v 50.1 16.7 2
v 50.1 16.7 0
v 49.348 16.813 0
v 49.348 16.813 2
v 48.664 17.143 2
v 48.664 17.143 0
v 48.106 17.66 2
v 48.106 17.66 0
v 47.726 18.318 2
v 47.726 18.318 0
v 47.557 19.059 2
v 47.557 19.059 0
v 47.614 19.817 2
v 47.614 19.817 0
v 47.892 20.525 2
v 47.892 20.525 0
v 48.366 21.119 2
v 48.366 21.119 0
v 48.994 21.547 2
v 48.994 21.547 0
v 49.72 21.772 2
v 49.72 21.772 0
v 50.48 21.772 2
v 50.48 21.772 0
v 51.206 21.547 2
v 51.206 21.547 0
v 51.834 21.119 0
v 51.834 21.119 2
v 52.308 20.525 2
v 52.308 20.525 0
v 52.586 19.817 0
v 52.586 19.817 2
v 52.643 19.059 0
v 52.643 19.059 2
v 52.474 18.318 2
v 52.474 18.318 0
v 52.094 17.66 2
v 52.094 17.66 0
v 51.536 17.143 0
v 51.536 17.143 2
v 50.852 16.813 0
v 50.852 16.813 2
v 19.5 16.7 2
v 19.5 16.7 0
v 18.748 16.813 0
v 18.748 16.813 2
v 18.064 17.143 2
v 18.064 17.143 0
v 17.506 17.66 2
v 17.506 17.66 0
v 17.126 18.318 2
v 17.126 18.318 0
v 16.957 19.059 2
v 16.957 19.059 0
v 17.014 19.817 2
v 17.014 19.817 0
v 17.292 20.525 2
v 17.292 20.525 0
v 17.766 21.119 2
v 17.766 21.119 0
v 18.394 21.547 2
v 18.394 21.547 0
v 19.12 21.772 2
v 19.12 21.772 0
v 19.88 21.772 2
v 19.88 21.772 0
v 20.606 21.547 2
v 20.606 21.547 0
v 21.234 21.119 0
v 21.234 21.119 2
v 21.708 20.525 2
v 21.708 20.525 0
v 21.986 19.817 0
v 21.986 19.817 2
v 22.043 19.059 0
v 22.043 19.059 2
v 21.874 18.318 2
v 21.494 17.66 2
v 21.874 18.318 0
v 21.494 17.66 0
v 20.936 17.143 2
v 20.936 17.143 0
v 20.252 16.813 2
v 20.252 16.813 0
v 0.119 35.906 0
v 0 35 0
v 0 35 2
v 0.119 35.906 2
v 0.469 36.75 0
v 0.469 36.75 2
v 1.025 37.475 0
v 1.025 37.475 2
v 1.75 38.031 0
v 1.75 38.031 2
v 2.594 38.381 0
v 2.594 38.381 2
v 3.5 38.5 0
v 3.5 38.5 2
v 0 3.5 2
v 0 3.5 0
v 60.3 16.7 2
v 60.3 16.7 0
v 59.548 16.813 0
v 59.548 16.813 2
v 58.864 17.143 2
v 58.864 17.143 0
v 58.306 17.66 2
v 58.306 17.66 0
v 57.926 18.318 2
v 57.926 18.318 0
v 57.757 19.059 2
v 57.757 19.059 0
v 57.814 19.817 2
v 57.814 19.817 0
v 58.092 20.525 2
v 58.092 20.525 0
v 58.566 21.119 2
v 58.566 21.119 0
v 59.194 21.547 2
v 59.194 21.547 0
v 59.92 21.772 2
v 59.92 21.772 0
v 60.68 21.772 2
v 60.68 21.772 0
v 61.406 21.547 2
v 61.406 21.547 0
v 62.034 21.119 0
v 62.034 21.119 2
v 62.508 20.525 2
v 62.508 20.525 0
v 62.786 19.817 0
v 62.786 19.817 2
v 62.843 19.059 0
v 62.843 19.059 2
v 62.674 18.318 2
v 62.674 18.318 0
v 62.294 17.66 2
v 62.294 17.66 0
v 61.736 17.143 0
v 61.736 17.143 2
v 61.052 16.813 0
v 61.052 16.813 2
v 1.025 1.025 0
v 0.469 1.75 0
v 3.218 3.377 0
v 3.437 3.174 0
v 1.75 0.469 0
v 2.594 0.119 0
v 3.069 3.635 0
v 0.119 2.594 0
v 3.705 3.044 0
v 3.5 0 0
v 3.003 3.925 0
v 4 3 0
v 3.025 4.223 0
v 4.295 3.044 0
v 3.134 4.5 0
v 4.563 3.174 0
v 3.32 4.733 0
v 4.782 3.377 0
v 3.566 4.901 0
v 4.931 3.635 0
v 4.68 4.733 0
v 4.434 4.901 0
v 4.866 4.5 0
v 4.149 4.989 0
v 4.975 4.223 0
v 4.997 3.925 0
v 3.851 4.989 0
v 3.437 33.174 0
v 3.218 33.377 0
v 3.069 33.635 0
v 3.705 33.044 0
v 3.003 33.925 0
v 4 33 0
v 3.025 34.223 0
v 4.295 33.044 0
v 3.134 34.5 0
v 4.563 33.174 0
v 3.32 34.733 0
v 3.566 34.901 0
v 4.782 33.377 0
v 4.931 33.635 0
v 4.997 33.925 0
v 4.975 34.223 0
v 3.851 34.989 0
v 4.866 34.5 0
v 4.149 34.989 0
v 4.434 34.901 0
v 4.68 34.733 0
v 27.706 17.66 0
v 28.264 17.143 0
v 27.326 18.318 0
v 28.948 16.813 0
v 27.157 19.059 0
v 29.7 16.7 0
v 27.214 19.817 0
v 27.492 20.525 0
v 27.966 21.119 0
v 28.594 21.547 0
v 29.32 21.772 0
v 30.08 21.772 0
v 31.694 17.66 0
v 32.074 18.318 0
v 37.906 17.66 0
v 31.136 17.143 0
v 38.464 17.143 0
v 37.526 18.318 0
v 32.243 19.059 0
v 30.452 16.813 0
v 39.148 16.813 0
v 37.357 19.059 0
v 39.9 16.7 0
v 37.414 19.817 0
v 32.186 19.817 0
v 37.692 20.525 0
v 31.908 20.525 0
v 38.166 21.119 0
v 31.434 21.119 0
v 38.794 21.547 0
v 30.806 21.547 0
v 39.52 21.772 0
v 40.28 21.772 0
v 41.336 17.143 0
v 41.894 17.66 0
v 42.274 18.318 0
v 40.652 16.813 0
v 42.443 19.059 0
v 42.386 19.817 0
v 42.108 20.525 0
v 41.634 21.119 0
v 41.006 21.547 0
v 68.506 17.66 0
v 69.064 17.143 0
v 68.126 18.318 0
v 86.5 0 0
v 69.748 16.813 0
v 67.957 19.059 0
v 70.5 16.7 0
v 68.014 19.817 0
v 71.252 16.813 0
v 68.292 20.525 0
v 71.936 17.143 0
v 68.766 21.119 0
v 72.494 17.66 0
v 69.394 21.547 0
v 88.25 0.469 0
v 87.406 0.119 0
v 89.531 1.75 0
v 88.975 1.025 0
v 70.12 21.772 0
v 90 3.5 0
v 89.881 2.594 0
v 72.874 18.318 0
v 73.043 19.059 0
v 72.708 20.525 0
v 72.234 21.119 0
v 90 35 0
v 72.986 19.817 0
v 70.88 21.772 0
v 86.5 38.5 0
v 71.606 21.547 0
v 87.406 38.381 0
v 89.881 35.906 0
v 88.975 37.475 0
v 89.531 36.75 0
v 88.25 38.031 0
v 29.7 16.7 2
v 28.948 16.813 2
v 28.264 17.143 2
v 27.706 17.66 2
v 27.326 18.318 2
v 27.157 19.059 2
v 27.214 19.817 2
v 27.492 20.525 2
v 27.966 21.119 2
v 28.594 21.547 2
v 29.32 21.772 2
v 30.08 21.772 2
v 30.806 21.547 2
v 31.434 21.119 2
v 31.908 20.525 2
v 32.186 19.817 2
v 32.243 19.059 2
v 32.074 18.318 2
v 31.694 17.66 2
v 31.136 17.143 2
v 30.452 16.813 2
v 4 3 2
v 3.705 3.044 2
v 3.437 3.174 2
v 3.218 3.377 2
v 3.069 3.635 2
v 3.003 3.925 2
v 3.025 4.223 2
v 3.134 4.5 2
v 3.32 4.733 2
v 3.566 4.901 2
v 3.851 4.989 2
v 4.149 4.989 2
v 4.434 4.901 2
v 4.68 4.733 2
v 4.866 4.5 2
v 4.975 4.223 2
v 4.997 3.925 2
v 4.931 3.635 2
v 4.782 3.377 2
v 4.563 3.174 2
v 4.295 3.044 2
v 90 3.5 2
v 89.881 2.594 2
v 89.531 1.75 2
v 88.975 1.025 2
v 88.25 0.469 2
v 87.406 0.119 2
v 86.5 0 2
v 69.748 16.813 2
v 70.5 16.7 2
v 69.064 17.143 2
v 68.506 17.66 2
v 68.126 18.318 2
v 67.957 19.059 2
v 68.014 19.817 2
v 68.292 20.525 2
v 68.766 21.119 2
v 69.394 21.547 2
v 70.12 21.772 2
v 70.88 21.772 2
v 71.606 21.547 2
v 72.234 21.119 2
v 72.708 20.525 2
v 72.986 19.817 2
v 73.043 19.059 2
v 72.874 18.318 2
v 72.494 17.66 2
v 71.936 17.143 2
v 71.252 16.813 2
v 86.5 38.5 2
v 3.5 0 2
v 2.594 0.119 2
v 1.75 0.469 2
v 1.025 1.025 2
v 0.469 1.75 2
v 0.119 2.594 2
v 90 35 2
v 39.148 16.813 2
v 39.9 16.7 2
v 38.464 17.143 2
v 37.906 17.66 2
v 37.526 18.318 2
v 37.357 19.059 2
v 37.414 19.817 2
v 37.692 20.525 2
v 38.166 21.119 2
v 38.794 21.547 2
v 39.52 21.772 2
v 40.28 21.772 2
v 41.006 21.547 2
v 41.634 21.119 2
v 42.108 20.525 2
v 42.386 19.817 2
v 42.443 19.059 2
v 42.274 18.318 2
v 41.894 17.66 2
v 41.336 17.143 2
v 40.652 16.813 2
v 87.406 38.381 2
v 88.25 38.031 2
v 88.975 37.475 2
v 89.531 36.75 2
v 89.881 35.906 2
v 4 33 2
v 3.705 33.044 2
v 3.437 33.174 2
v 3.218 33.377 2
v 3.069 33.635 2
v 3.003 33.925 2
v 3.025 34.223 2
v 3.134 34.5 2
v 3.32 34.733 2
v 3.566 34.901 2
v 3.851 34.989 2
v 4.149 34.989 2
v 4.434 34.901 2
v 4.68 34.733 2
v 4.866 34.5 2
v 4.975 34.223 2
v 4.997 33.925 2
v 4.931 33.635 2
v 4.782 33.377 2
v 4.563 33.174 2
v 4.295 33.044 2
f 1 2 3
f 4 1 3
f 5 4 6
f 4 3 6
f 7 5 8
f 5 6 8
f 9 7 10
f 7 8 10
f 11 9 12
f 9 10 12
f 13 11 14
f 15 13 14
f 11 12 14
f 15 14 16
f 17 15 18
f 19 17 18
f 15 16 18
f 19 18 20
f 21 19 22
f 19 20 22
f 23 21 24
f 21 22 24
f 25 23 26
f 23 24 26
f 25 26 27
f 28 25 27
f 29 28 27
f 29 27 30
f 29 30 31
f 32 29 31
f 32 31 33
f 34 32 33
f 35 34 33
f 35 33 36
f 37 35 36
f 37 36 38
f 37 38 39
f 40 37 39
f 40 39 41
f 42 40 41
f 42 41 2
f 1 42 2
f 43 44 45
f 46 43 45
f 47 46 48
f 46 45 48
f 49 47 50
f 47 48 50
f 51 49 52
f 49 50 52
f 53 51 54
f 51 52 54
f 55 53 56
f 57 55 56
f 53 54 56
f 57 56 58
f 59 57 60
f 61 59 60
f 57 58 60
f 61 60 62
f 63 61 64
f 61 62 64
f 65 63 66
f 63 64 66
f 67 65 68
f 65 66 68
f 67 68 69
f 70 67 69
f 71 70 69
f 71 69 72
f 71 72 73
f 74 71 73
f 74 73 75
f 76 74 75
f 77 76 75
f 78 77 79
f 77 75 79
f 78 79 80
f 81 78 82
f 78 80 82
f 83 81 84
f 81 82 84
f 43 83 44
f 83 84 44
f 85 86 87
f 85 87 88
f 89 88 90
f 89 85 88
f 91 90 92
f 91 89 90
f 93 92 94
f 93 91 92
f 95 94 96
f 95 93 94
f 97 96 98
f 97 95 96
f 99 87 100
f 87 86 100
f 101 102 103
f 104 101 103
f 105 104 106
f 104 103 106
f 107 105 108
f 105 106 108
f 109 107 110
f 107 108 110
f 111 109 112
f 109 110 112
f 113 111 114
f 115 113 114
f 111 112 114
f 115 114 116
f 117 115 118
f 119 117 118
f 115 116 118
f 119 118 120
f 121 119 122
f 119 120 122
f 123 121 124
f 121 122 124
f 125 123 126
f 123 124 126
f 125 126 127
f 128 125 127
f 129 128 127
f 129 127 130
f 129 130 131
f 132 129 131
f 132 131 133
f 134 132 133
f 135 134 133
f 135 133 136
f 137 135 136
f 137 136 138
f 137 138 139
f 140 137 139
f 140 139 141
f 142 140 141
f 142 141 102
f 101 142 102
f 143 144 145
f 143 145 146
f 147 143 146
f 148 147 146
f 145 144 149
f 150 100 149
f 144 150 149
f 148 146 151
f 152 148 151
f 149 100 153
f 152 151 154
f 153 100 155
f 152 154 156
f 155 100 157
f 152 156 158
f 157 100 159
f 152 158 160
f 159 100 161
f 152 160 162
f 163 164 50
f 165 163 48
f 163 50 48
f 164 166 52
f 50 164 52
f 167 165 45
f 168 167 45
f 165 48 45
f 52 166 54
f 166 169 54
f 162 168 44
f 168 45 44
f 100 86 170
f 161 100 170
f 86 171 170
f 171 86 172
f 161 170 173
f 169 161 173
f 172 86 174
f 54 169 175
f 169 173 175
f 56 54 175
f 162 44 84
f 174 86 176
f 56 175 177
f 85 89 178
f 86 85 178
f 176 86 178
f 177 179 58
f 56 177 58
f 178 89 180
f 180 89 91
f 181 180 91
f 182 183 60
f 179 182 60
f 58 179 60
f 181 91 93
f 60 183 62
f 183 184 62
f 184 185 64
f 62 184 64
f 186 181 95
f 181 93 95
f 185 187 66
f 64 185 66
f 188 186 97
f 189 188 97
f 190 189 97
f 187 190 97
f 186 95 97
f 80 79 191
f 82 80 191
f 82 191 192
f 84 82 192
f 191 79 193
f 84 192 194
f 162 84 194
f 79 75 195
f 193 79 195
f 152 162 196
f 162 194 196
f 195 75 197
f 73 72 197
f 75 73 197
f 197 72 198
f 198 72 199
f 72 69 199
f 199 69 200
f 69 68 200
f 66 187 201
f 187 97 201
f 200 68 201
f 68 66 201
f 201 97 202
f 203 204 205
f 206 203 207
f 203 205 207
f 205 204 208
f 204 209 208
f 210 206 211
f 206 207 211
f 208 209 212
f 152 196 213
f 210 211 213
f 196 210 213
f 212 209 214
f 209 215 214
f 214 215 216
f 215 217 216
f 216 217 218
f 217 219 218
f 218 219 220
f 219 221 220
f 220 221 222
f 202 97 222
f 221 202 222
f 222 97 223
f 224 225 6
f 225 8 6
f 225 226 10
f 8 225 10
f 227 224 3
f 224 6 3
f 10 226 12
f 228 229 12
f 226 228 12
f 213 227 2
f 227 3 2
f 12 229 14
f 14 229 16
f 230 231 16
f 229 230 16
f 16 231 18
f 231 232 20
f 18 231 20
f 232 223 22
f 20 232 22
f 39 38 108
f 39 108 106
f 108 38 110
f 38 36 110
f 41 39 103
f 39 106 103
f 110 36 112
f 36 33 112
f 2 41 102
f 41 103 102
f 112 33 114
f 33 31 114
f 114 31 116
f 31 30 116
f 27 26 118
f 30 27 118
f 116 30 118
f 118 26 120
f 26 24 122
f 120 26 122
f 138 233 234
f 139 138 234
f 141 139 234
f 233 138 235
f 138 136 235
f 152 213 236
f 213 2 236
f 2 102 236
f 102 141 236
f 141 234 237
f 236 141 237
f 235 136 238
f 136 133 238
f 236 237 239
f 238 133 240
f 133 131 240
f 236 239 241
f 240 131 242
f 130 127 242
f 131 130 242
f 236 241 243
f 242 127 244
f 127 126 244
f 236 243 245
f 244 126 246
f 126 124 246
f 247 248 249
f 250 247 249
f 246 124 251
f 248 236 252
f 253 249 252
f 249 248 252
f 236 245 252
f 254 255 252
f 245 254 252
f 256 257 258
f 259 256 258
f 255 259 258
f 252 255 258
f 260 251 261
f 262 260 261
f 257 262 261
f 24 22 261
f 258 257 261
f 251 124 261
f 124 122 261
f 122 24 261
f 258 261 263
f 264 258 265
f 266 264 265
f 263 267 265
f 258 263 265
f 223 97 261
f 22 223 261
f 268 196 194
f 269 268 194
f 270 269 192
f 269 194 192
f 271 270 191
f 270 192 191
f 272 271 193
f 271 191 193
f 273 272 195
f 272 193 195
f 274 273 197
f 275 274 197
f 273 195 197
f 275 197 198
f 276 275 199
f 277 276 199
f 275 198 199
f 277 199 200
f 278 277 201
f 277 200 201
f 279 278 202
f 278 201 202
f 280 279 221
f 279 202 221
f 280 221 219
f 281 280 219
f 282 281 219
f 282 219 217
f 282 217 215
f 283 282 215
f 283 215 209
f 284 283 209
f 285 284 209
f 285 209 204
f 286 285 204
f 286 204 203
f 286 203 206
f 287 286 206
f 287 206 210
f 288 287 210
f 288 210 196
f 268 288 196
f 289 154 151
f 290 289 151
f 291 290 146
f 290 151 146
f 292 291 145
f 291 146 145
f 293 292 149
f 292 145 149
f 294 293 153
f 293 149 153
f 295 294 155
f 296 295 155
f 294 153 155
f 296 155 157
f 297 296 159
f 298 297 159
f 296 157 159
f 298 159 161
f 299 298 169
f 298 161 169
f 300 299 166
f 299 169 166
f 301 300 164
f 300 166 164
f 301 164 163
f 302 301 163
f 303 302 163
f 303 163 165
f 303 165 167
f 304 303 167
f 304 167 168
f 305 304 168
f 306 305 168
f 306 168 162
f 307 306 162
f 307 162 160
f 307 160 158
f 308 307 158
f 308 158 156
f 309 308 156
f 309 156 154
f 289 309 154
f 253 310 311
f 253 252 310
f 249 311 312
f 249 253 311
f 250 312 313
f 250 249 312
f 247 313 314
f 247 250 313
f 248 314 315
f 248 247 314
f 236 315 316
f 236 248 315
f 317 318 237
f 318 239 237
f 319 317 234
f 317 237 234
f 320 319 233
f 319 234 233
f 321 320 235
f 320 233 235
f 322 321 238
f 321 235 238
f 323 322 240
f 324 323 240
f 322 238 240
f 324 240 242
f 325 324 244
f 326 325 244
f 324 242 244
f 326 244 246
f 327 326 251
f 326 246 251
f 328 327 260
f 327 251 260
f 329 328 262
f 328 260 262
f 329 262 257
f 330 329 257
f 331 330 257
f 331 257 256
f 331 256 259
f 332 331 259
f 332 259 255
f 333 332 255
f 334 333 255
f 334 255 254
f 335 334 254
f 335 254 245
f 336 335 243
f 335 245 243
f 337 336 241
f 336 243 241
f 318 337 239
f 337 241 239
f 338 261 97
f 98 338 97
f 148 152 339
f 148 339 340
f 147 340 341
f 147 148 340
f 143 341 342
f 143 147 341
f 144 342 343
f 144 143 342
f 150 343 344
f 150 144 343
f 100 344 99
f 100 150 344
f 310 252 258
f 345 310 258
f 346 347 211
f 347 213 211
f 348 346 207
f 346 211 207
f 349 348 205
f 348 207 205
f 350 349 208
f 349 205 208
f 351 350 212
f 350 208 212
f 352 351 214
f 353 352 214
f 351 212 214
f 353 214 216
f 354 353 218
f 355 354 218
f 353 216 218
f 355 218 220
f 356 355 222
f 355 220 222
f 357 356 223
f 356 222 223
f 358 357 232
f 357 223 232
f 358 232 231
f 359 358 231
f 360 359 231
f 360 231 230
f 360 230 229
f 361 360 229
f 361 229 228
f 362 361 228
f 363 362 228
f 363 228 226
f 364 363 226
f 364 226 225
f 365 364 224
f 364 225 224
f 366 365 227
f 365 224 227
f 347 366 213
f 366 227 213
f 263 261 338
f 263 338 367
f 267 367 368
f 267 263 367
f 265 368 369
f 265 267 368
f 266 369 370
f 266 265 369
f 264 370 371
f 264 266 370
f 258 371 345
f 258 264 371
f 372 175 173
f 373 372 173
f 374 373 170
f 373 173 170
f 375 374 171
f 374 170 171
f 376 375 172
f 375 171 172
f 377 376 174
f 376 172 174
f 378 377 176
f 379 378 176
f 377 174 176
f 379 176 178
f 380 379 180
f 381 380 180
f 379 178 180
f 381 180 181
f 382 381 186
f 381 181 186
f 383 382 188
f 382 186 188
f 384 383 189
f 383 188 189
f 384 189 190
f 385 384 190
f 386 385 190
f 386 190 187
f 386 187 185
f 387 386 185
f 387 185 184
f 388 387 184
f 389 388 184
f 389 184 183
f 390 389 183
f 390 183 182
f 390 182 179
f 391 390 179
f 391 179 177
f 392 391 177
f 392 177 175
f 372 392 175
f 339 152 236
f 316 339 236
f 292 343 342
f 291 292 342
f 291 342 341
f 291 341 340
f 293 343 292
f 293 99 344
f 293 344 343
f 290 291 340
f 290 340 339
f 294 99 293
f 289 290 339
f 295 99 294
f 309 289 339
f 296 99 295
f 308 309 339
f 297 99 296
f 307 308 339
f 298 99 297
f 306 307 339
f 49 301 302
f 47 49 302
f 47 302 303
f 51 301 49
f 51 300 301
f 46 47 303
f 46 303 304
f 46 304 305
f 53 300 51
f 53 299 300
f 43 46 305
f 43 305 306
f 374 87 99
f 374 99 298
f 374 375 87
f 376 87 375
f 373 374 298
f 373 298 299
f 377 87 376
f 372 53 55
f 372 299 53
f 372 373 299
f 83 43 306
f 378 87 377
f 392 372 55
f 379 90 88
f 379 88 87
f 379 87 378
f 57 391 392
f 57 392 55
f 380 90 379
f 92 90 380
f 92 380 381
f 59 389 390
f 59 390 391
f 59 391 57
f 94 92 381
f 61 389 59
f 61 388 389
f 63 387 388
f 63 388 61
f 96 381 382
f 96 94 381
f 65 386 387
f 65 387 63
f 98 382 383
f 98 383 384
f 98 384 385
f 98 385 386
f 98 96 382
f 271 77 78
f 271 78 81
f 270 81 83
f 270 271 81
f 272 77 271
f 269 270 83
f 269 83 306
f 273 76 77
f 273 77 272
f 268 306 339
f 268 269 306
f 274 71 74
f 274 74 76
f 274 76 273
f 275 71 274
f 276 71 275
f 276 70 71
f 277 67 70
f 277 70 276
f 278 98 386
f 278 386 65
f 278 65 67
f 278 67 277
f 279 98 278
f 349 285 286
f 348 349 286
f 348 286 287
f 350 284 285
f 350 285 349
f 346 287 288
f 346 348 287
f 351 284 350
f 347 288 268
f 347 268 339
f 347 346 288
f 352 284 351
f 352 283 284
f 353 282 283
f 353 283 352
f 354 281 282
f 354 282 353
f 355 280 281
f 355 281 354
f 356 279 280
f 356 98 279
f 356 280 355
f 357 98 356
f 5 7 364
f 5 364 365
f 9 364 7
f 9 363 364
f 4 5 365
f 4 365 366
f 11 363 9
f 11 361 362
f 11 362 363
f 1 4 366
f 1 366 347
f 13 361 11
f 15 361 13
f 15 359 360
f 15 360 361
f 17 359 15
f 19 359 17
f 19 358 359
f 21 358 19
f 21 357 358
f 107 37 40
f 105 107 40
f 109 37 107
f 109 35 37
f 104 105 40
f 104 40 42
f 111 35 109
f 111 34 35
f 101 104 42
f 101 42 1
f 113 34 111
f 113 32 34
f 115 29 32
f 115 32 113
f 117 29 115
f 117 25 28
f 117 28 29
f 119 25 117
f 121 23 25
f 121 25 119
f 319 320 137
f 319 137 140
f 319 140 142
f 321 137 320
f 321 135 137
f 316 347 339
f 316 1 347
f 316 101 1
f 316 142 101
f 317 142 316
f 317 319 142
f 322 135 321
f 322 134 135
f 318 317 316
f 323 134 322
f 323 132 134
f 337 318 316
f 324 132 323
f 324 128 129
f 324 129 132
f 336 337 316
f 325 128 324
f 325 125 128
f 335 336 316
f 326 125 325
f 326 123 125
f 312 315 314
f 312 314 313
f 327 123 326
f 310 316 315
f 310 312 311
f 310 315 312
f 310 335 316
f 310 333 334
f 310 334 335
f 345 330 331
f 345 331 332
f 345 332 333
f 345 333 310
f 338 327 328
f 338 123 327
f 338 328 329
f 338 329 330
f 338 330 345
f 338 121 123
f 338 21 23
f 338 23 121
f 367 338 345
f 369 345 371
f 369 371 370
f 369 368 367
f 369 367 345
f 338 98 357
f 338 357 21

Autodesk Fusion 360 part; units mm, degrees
sketch "スケッチ1" plane through (0, 0, 0) normal (0, 0, 1) x (1, 0, 0)
  line L0 (3.5, 0) -> (86.5, 0)
  line L1 (90, 3.5) -> (90, 35)
  line L2 (86.5, 38.5) -> (3.5, 38.5)
  line L3 (0, 35) -> (0, 3.5)
  line L4 (0, 19.25) -> (90, 19.25)
  arc A0 (3.5, 38.5) -> (0, 35) centre (3.5, 35) ccw
  arc A1 (90, 35) -> (86.5, 38.5) centre (86.5, 35) ccw
  arc A2 (86.5, 0) -> (90, 3.5) centre (86.5, 3.5) ccw
  arc A3 (0, 3.5) -> (3.5, 0) centre (3.5, 3.5) ccw
  point P0 (90, 0)
  point P1 (0, 38.5)
  dimension "d1" = 90
  dimension "d2" = 38.5
  dimension "d3" = 3.5
extrude "押し出し1" add sketch "スケッチ1" along normal blind 2
sketch "スケッチ2" plane through (0, 0, 2) normal (0, 0, 1) x (-1, 0, 0)
  arc A0 (0, -3.5) -> (-3.5, 0) centre (-3.5, -3.5) ccw
  line L0 (-3.5, 0) -> (-86.5, 0)
  arc A1 (-86.5, 0) -> (-90, -3.5) centre (-86.5, -3.5) ccw
  line L1 (-90, -3.5) -> (-90, -35)
  arc A2 (-90, -35) -> (-86.5, -38.5) centre (-86.5, -35) ccw
  line L2 (-86.5, -38.5) -> (-3.5, -38.5)
  arc A3 (-3.5, -38.5) -> (0, -35) centre (-3.5, -35) ccw
  line L3 (0, -35) -> (0, -3.5)
  line L4 (-45, -38.5) -> (-45, 0)
  line L5 (0, -19.25) -> (-90, -19.25)
  line L6 (-45, -19.25) -> (-50.1, -19.25)
  line L7 (-50.1, -19.25) -> (-60.3, -19.25)
  line L8 (-60.3, -19.25) -> (-70.5, -19.25)
  point P0 (-50.1, -19.25)
  point P1 (-60.3, -19.25)
  point P2 (-70.5, -19.25)
  point P3 (-39.9, -19.25)
  point P4 (-29.7, -19.25)
  point P5 (-19.5, -19.25)
  dimension "d6" = 5.1
  dimension "d7" = 10.2
  dimension "d8" = 10.2
hole "穴1" at (19.5, 19.25, 2) at (29.7, 19.25, 2) at (39.9, 19.25, 2) at (50.1, 19.25, 2) at (60.3, 19.25, 2) at (70.5, 19.25, 2) direction (0, 0, -1) diameter 5.1 depth 2 tip angle 180
sketch "スケッチ3" plane through (0, 0, 2) normal (0, 0, 1) x (-1, 0, 0)
  circle A0 centre (-60.3, -19.25) radius 2.55
  circle A1 centre (-39.9, -19.25) radius 2.55
  circle A2 centre (-19.5, -19.25) radius 2.55
  circle A3 centre (-29.7, -19.25) radius 2.55
  circle A4 centre (-50.1, -19.25) radius 2.55
  circle A5 centre (-70.5, -19.25) radius 2.55
  arc A6 (0, -3.5) -> (-3.5, 0) centre (-3.5, -3.5) ccw
  line L0 (-3.5, 0) -> (-86.5, 0)
  arc A7 (-86.5, 0) -> (-90, -3.5) centre (-86.5, -3.5) ccw
  line L1 (-90, -3.5) -> (-90, -35)
  arc A8 (-90, -35) -> (-86.5, -38.5) centre (-86.5, -35) ccw
  line L2 (-86.5, -38.5) -> (-3.5, -38.5)
  arc A9 (-3.5, -38.5) -> (0, -35) centre (-3.5, -35) ccw
  line L3 (0, -35) -> (0, -3.5)
  line L4 (-4, -4) -> (-4, -34)
hole "穴2" at (4, 4, 2) at (4, 34, 2) direction (0, 0, -1) diameter 2 depth 2 tip angle 180
sketch "スケッチ5" plane through (0, 0, 0) normal (0, 0, 1) x (1, 0, 0)
sketch "スケッチ6" plane through (0, 0, 0) normal (0, 0, 1) x (1, 0, 0)
